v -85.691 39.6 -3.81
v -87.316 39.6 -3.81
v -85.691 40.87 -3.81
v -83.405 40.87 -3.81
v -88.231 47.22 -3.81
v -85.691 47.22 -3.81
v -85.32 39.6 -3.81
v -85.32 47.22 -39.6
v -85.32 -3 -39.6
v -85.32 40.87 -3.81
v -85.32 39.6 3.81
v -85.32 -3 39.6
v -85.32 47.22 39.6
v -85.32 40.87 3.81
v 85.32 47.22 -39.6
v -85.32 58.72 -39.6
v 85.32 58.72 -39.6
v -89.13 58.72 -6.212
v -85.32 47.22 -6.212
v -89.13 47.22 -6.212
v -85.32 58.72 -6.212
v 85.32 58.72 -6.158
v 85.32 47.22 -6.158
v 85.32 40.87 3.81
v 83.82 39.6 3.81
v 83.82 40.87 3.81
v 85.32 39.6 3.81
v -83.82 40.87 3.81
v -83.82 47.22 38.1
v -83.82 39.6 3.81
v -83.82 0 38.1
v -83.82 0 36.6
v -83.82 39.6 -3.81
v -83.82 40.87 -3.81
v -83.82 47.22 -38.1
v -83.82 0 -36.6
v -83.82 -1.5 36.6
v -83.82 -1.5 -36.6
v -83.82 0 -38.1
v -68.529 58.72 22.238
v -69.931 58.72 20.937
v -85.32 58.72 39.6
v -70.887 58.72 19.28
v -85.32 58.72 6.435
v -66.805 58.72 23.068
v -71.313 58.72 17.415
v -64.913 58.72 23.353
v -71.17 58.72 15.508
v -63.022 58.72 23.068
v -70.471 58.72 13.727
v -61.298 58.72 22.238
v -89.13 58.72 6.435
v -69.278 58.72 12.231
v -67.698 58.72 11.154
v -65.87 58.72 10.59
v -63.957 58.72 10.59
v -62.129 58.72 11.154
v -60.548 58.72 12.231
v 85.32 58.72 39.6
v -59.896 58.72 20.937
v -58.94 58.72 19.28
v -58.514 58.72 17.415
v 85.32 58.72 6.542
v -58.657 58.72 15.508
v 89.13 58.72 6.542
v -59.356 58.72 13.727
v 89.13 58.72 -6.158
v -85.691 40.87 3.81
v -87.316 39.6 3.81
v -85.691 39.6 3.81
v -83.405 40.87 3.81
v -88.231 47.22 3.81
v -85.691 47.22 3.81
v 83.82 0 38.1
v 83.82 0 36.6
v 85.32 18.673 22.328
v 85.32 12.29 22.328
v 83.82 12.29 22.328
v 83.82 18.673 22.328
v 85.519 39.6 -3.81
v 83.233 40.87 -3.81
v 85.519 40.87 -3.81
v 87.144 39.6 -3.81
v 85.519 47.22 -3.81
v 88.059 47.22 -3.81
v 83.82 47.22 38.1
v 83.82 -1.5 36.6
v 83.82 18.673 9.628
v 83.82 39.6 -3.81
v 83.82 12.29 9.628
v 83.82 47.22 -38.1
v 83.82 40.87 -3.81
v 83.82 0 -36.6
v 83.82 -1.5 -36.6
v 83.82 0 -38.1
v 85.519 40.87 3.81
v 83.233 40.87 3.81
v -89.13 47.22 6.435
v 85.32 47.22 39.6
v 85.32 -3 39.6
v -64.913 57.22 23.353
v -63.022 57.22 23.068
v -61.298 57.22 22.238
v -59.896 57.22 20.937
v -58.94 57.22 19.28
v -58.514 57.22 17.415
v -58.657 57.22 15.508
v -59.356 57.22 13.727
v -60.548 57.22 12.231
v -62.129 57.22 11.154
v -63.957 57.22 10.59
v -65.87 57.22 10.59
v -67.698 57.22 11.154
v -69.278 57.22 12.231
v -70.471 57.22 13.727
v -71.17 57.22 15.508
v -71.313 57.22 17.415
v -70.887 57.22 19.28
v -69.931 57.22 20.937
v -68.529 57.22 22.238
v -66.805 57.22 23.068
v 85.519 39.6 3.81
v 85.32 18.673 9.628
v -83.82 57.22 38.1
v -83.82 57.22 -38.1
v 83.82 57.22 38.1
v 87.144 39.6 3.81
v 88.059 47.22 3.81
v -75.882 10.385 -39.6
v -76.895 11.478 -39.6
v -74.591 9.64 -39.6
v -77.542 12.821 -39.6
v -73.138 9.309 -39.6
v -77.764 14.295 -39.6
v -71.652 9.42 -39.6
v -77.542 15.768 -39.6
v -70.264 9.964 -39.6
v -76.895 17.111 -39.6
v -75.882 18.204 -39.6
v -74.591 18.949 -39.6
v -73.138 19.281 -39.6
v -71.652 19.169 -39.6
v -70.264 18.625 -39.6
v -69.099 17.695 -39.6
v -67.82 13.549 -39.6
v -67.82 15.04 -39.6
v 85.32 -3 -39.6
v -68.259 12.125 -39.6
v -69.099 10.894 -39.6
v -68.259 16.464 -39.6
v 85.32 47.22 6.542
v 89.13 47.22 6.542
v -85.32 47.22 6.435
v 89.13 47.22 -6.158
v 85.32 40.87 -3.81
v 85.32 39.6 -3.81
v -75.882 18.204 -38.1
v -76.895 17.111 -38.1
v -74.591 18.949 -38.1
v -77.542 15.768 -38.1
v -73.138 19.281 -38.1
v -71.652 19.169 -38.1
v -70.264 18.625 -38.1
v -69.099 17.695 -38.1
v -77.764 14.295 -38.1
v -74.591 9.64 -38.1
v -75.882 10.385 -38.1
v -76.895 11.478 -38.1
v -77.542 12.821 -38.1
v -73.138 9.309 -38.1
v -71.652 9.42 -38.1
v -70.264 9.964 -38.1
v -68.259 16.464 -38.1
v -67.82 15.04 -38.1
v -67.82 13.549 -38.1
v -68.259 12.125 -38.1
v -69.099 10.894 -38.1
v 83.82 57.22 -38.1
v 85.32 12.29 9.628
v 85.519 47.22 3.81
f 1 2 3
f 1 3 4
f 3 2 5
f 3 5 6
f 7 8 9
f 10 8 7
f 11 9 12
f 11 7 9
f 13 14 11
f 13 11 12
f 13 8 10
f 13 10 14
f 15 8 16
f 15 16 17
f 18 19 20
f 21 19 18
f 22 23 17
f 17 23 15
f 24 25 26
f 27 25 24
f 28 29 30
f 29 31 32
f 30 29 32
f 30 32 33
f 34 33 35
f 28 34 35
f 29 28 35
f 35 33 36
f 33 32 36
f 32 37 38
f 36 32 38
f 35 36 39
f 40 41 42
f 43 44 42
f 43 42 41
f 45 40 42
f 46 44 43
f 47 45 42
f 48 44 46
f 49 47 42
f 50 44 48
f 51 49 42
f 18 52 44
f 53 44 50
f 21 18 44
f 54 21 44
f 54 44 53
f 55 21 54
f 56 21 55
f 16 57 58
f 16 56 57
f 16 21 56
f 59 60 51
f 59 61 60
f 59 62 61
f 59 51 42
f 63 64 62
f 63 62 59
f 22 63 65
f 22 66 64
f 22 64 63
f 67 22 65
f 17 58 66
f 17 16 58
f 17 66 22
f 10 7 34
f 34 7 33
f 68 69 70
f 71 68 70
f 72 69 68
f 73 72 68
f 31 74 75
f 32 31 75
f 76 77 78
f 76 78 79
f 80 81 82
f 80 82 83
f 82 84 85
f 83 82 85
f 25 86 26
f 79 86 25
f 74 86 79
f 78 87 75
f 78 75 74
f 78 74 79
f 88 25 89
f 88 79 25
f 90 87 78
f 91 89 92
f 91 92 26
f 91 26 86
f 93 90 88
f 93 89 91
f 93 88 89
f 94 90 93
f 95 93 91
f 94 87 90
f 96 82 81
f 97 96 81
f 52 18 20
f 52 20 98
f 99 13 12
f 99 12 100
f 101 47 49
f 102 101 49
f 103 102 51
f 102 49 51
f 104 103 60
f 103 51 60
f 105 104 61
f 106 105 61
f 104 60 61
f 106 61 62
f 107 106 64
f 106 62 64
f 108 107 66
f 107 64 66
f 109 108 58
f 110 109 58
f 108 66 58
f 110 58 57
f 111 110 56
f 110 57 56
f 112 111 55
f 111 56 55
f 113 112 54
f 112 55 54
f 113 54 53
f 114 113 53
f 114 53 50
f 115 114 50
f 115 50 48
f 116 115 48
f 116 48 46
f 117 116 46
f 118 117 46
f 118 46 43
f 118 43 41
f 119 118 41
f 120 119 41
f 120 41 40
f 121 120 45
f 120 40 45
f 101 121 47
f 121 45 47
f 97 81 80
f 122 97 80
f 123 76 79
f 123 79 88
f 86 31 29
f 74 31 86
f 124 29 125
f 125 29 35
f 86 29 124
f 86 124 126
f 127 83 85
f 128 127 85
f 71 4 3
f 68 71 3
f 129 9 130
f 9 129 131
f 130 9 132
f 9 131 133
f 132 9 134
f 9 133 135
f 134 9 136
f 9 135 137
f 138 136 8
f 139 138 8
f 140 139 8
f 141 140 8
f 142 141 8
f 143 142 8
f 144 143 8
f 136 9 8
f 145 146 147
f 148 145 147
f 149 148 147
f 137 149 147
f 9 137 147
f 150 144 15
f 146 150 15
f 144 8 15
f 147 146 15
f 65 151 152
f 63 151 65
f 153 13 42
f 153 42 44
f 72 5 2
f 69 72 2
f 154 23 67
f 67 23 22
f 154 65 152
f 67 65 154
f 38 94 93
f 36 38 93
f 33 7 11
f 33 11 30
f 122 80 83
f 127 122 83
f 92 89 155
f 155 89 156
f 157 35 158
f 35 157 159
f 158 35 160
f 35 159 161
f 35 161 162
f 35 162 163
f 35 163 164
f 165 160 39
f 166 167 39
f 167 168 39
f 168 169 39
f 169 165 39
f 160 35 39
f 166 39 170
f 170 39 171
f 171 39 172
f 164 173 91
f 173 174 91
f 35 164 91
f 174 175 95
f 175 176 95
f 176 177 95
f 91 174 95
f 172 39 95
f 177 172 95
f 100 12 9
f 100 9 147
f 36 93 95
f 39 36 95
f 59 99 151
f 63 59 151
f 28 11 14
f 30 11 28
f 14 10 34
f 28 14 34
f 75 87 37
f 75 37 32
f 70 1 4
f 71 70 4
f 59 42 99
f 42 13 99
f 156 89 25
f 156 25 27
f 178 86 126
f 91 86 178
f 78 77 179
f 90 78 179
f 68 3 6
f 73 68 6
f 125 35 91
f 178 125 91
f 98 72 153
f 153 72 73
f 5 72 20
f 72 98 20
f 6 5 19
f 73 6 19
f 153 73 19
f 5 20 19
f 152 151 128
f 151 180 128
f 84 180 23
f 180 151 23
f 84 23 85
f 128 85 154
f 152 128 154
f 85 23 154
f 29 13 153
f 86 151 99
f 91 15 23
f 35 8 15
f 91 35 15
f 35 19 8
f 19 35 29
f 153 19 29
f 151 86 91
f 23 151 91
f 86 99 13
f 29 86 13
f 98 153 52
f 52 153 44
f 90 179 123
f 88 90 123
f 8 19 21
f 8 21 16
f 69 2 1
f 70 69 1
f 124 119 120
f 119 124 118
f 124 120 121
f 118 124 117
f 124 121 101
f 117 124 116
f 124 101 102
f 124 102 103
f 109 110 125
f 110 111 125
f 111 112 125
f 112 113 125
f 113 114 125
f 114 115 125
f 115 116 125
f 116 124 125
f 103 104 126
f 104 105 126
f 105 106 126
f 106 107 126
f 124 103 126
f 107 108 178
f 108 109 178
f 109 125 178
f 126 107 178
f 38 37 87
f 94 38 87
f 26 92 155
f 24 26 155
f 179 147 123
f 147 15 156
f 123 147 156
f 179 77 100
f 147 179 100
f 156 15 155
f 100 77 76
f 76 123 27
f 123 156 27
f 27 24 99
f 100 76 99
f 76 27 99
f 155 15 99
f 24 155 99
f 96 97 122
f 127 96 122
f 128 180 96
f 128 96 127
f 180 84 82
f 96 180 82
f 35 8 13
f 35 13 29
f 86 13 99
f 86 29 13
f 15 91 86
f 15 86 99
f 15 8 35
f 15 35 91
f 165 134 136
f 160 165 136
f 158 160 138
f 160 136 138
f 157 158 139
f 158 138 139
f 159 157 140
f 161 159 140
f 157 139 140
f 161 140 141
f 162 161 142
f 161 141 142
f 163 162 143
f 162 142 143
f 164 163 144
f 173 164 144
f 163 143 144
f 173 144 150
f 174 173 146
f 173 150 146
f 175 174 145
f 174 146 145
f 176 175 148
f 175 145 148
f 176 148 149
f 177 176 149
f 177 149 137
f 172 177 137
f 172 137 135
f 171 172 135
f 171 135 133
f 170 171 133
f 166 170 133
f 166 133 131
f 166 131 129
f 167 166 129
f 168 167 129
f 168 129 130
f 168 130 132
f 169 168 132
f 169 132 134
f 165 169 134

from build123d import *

# Parameters (mm, degrees)
SKETCH15_W             = 167.64
SKETCH15_H             = 76.2
BB_STM_SIHLOETTE_DEPTH = 1.5
BASEWALL_DEPTH         = 45.72
BASEWALL_DEPTH_BACK    = 3
SKETCH29_W             = 170.64
SKETCH29_H             = 79.2
SKETCH29_W_2           = 167.64
SKETCH29_H_2           = 76.2
SKETCH31_W             = 1.5
SKETCH31_H             = 1.5
BASESUPPORT_DEPTH      = 169.14
BASESUPPORT_2_DEPTH    = 169.14
SKETCH33_W             = 170.64
SKETCH33_H             = 79.2
BASEBOTTOM_DEPTH       = 1.5
SKETCH43_W             = 12.7
SKETCH43_H             = 6.383756828
CUT_EXTRUDE8_DEPTH     = 1.5
SKETCH36_W             = 170.64
SKETCH36_H             = 79.2
SKETCH36_W_2           = 167.64
SKETCH36_H_2           = 76.2
BOSS_EXTRUDE16_DEPTH   = 10
SKETCH37_W             = 170.64
SKETCH37_H             = 79.2
BOSS_EXTRUDE17_DEPTH   = 1.5
SKETCH39_R             = 5
CUT_EXTRUDE5_DEPTH     = 4.802
SKETCH41_R             = 6.417528543
CUT_EXTRUDE6_DEPTH     = 1.5
SKETCH46_W             = 12.7
SKETCH46_H             = 11.5
BOSS_EXTRUDE18_DEPTH   = 3.81
SNAP_START             = -3.81
SNAP_HOOK4_DEPTH       = 7.62
SNAP_START_2           = 39.6
SNAP_GROOVE3_OUTLINE_W = 1.5
SNAP_GROOVE3_OUTLINE_H = 7.62
SNAP_GROOVE3_DEPTH     = 1.27
SKETCH51_W             = 12.647680061
SKETCH51_H             = 11.5
BOSS_EXTRUDE19_DEPTH   = 3.81
SNAP_HOOK5_DEPTH       = 7.62
SNAP_GROOVE4_OUTLINE_W = 1.5
SNAP_GROOVE4_OUTLINE_H = 7.62
SNAP_GROOVE4_DEPTH     = 1.27


# Read off the part's stored shape, not the designer's step: Snap Hook4, Snap Groove3, Snap Hook5, Snap Groove4
with BuildPart() as part:
    # Sketch15 → BB+STM Sihloette (new body)
    with BuildSketch(Plane(origin=(0, 0, 0), x_dir=(1, 0, 0), z_dir=(0, 1, 0))):
        Rectangle(SKETCH15_W, SKETCH15_H)
    extrude(amount=BB_STM_SIHLOETTE_DEPTH)


with BuildPart() as body_2:
    # Sketch29 → basewall (new, two sides: drawn at the far end of the back side and taken through both)
    with BuildSketch(Plane(origin=(0, 1.5, 0), x_dir=(1, 0, 0), z_dir=(0, 1, 0)).offset(-BASEWALL_DEPTH_BACK)):
        Rectangle(SKETCH29_W, SKETCH29_H)
        Rectangle(SKETCH29_W_2, SKETCH29_H_2, mode=Mode.SUBTRACT)
    extrude(amount=BASEWALL_DEPTH + BASEWALL_DEPTH_BACK)



with BuildPart() as body_3:
    # Sketch31 → basesupport (new body)
    with BuildSketch(Plane(origin=(85.32, 0, 0), x_dir=(0, 0, -1), z_dir=(1, 0, 0))):
        with Locations((37.35, -0.75)):
            Rectangle(SKETCH31_W, SKETCH31_H)
    extrude(amount=-BASESUPPORT_DEPTH)


with BuildPart() as body_4:
    # Sketch31 → basesupport 2 (new body)
    with BuildSketch(Plane(origin=(85.32, 0, 0), x_dir=(0, 0, -1), z_dir=(1, 0, 0))):
        with Locations((-37.35, -0.75)):
            Rectangle(SKETCH31_W, SKETCH31_H)
    extrude(amount=-BASESUPPORT_2_DEPTH)


with BuildPart() as body_2_1:
    add(body_2.part)

    add(body_3.part)  # basebottom merges body 3

    add(body_4.part)  # basebottom merges body 4
    # Sketch33 → basebottom (add)
    with BuildSketch(Plane.XZ.offset(1.5)):
        Rectangle(SKETCH33_W, SKETCH33_H)
    extrude(amount=BASEBOTTOM_DEPTH)

    # Sketch43 → Cut-Extrude8 (cut)
    with BuildSketch(Plane(origin=(85.32, 0, 0), x_dir=(0, 0, -1), z_dir=(1, 0, 0))):
        with Locations((-15.978, 15.481398318)):
            Rectangle(SKETCH43_W, SKETCH43_H)
    extrude(amount=-CUT_EXTRUDE8_DEPTH, mode=Mode.SUBTRACT)

    # Sketch39 → Cut-Extrude5 (cut)
    with BuildSketch(Plane(origin=(0, 0, -39.6), x_dir=(-1, 0, 0), z_dir=(0, 0, -1))):
        with Locations((72.764290204, 14.294611028)):
            Circle(SKETCH39_R)
    extrude(amount=-CUT_EXTRUDE5_DEPTH, mode=Mode.SUBTRACT)

    # Snap Groove3 outline → Snap Groove3 (cut)
    with BuildSketch(Plane(origin=(0, 0, 0), x_dir=(1, 0, 0), z_dir=(0, 1, 0)).offset(SNAP_START_2)):
        with Locations((84.57, 0)):
            Rectangle(SNAP_GROOVE3_OUTLINE_W, SNAP_GROOVE3_OUTLINE_H)
    extrude(amount=SNAP_GROOVE3_DEPTH, mode=Mode.SUBTRACT)

    # Snap Groove4 outline → Snap Groove4 (cut)
    with BuildSketch(Plane(origin=(0, 0, 0), x_dir=(1, 0, 0), z_dir=(0, 1, 0)).offset(SNAP_START_2)):
        with Locations((-84.57, 0)):
            Rectangle(SNAP_GROOVE4_OUTLINE_W, SNAP_GROOVE4_OUTLINE_H)
    extrude(amount=SNAP_GROOVE4_DEPTH, mode=Mode.SUBTRACT)


with BuildPart() as body_2_2:
    # Sketch36 → Boss-Extrude16 (new body)
    with BuildSketch(Plane(origin=(0, 47.22, 0), x_dir=(1, 0, 0), z_dir=(0, 1, 0))):
        Rectangle(SKETCH36_W, SKETCH36_H)
        Rectangle(SKETCH36_W_2, SKETCH36_H_2, mode=Mode.SUBTRACT)
    extrude(amount=BOSS_EXTRUDE16_DEPTH)

    # Sketch37 → Boss-Extrude17 (add)
    with BuildSketch(Plane(origin=(0, 57.22, 0), x_dir=(1, 0, 0), z_dir=(0, 1, 0))):
        Rectangle(SKETCH37_W, SKETCH37_H)
    extrude(amount=BOSS_EXTRUDE17_DEPTH)

    # Sketch41 → Cut-Extrude6 (cut)
    with BuildSketch(Plane(origin=(0, 58.72, 0), x_dir=(1, 0, 0), z_dir=(0, 1, 0))):
        with Locations(Location((-64.913453937, -16.935860424, 0), (0, 0, 270))):
            Circle(SKETCH41_R)
    extrude(amount=-CUT_EXTRUDE6_DEPTH, mode=Mode.SUBTRACT)

    # Sketch46 → Boss-Extrude18 (add)
    with BuildSketch(Plane(origin=(85.32, 0, 0), x_dir=(0, 0, -1), z_dir=(1, 0, 0))):
        with Locations((-0.191641666, 52.97)):
            Rectangle(SKETCH46_W, SKETCH46_H)
    extrude(amount=BOSS_EXTRUDE18_DEPTH)

    # Snap Hook4 outline → Snap Hook4 (add)
    with BuildSketch(Plane.XY.offset(SNAP_START)):
        Polygon((88.058695511, 47.22), (85.518695511, 47.22), (85.518695511, 40.87), (83.232695511, 40.87), (85.518695511, 39.6), (87.144295511, 39.6), align=None)
    extrude(amount=SNAP_HOOK4_DEPTH)

    # Sketch51 → Boss-Extrude19 (add)
    with BuildSketch(Plane.ZY.offset(85.32)):
        with Locations((0.111644465, 52.97)):
            Rectangle(SKETCH51_W, SKETCH51_H)
    extrude(amount=BOSS_EXTRUDE19_DEPTH)

    # Snap Hook5 outline → Snap Hook5 (add)
    with BuildSketch(Plane.XY.offset(SNAP_START)):
        Polygon((-88.230545756, 47.22), (-87.316145756, 39.6), (-85.690545756, 39.6), (-83.404545756, 40.87), (-85.690545756, 40.87), (-85.690545756, 47.22), align=None)
    extrude(amount=SNAP_HOOK5_DEPTH)


solid = Compound([body_2_1.part, body_2_2.part])
